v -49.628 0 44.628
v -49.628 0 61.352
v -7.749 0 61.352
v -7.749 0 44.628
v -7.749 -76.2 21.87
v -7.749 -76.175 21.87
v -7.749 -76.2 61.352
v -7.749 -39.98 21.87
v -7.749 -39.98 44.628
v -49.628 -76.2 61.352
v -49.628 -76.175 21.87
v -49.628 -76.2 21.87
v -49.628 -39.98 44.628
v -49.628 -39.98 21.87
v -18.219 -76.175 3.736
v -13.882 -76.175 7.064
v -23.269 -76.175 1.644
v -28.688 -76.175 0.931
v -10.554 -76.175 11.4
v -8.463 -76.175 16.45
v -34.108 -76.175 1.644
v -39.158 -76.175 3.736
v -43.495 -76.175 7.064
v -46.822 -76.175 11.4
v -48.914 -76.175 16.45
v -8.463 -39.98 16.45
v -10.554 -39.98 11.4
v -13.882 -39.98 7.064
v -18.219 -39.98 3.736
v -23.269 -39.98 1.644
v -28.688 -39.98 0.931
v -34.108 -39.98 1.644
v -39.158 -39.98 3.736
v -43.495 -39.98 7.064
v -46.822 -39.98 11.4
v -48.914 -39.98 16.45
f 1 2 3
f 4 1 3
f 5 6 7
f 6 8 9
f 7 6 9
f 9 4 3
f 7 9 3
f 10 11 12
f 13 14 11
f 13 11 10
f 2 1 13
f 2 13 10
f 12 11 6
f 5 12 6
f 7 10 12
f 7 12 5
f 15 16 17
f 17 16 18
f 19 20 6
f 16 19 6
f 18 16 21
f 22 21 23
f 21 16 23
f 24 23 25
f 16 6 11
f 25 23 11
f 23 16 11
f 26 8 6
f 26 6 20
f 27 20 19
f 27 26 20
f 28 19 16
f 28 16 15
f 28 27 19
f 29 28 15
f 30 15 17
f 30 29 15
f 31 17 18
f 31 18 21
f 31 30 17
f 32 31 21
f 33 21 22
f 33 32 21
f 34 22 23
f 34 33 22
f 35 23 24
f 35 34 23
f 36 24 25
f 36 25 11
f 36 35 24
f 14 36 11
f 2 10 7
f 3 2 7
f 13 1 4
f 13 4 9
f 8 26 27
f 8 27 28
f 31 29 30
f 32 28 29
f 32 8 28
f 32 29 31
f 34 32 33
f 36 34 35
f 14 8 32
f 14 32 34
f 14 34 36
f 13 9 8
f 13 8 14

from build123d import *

# Parameters (mm, degrees)
F0_W     = 41.8783635832
F0_H     = 39.4817627966
F1_DEPTH = 76.2
F3_DEPTH = 76.2
F5_DEPTH = 36.195
F7_DEPTH = 76.2


with BuildPart() as f1:
    # F0 (on Front) → F1 (new body)
    with BuildSketch(Plane.XZ):
        with Locations((-28.6883309018, 41.6107345372)):
            Rectangle(F0_W, F0_H)
    extrude(amount=F1_DEPTH)

    # F2 (on face) → F3 (cut)
    with BuildSketch(Plane.YZ.offset(-7.7491491102)):
        Polygon((0, 21.8698531389), (-39.980173111, 44.6278005838), (-39.980173111, 21.8698531389), align=None)
    extrude(amount=-F3_DEPTH, mode=Mode.SUBTRACT)

    # F4 (on face) → F5 (join)
    with BuildSketch(Plane(origin=(0, -39.980173111, 0), x_dir=(-1, 0, 0), z_dir=(0, 1, 0))):
        with BuildLine():
            Line((49.6275126934, 21.8698531389), (7.7491491102, 21.8698531389))
            ThreePointArc((7.7491491102, 21.8698531389), (28.6883309018, 0.9306713473), (49.6275126934, 21.8698531389))
        make_face()
    extrude(amount=-F5_DEPTH)

    # F6 (on face) → F7 (cut)
    with BuildSketch(Plane.YZ.offset(-7.7491491102)):
        Polygon((0, 44.6278005838), (-39.980173111, 44.6278005838), (0, 21.8698531389), align=None)
    extrude(amount=-F7_DEPTH, mode=Mode.SUBTRACT)


solid = f1.part
